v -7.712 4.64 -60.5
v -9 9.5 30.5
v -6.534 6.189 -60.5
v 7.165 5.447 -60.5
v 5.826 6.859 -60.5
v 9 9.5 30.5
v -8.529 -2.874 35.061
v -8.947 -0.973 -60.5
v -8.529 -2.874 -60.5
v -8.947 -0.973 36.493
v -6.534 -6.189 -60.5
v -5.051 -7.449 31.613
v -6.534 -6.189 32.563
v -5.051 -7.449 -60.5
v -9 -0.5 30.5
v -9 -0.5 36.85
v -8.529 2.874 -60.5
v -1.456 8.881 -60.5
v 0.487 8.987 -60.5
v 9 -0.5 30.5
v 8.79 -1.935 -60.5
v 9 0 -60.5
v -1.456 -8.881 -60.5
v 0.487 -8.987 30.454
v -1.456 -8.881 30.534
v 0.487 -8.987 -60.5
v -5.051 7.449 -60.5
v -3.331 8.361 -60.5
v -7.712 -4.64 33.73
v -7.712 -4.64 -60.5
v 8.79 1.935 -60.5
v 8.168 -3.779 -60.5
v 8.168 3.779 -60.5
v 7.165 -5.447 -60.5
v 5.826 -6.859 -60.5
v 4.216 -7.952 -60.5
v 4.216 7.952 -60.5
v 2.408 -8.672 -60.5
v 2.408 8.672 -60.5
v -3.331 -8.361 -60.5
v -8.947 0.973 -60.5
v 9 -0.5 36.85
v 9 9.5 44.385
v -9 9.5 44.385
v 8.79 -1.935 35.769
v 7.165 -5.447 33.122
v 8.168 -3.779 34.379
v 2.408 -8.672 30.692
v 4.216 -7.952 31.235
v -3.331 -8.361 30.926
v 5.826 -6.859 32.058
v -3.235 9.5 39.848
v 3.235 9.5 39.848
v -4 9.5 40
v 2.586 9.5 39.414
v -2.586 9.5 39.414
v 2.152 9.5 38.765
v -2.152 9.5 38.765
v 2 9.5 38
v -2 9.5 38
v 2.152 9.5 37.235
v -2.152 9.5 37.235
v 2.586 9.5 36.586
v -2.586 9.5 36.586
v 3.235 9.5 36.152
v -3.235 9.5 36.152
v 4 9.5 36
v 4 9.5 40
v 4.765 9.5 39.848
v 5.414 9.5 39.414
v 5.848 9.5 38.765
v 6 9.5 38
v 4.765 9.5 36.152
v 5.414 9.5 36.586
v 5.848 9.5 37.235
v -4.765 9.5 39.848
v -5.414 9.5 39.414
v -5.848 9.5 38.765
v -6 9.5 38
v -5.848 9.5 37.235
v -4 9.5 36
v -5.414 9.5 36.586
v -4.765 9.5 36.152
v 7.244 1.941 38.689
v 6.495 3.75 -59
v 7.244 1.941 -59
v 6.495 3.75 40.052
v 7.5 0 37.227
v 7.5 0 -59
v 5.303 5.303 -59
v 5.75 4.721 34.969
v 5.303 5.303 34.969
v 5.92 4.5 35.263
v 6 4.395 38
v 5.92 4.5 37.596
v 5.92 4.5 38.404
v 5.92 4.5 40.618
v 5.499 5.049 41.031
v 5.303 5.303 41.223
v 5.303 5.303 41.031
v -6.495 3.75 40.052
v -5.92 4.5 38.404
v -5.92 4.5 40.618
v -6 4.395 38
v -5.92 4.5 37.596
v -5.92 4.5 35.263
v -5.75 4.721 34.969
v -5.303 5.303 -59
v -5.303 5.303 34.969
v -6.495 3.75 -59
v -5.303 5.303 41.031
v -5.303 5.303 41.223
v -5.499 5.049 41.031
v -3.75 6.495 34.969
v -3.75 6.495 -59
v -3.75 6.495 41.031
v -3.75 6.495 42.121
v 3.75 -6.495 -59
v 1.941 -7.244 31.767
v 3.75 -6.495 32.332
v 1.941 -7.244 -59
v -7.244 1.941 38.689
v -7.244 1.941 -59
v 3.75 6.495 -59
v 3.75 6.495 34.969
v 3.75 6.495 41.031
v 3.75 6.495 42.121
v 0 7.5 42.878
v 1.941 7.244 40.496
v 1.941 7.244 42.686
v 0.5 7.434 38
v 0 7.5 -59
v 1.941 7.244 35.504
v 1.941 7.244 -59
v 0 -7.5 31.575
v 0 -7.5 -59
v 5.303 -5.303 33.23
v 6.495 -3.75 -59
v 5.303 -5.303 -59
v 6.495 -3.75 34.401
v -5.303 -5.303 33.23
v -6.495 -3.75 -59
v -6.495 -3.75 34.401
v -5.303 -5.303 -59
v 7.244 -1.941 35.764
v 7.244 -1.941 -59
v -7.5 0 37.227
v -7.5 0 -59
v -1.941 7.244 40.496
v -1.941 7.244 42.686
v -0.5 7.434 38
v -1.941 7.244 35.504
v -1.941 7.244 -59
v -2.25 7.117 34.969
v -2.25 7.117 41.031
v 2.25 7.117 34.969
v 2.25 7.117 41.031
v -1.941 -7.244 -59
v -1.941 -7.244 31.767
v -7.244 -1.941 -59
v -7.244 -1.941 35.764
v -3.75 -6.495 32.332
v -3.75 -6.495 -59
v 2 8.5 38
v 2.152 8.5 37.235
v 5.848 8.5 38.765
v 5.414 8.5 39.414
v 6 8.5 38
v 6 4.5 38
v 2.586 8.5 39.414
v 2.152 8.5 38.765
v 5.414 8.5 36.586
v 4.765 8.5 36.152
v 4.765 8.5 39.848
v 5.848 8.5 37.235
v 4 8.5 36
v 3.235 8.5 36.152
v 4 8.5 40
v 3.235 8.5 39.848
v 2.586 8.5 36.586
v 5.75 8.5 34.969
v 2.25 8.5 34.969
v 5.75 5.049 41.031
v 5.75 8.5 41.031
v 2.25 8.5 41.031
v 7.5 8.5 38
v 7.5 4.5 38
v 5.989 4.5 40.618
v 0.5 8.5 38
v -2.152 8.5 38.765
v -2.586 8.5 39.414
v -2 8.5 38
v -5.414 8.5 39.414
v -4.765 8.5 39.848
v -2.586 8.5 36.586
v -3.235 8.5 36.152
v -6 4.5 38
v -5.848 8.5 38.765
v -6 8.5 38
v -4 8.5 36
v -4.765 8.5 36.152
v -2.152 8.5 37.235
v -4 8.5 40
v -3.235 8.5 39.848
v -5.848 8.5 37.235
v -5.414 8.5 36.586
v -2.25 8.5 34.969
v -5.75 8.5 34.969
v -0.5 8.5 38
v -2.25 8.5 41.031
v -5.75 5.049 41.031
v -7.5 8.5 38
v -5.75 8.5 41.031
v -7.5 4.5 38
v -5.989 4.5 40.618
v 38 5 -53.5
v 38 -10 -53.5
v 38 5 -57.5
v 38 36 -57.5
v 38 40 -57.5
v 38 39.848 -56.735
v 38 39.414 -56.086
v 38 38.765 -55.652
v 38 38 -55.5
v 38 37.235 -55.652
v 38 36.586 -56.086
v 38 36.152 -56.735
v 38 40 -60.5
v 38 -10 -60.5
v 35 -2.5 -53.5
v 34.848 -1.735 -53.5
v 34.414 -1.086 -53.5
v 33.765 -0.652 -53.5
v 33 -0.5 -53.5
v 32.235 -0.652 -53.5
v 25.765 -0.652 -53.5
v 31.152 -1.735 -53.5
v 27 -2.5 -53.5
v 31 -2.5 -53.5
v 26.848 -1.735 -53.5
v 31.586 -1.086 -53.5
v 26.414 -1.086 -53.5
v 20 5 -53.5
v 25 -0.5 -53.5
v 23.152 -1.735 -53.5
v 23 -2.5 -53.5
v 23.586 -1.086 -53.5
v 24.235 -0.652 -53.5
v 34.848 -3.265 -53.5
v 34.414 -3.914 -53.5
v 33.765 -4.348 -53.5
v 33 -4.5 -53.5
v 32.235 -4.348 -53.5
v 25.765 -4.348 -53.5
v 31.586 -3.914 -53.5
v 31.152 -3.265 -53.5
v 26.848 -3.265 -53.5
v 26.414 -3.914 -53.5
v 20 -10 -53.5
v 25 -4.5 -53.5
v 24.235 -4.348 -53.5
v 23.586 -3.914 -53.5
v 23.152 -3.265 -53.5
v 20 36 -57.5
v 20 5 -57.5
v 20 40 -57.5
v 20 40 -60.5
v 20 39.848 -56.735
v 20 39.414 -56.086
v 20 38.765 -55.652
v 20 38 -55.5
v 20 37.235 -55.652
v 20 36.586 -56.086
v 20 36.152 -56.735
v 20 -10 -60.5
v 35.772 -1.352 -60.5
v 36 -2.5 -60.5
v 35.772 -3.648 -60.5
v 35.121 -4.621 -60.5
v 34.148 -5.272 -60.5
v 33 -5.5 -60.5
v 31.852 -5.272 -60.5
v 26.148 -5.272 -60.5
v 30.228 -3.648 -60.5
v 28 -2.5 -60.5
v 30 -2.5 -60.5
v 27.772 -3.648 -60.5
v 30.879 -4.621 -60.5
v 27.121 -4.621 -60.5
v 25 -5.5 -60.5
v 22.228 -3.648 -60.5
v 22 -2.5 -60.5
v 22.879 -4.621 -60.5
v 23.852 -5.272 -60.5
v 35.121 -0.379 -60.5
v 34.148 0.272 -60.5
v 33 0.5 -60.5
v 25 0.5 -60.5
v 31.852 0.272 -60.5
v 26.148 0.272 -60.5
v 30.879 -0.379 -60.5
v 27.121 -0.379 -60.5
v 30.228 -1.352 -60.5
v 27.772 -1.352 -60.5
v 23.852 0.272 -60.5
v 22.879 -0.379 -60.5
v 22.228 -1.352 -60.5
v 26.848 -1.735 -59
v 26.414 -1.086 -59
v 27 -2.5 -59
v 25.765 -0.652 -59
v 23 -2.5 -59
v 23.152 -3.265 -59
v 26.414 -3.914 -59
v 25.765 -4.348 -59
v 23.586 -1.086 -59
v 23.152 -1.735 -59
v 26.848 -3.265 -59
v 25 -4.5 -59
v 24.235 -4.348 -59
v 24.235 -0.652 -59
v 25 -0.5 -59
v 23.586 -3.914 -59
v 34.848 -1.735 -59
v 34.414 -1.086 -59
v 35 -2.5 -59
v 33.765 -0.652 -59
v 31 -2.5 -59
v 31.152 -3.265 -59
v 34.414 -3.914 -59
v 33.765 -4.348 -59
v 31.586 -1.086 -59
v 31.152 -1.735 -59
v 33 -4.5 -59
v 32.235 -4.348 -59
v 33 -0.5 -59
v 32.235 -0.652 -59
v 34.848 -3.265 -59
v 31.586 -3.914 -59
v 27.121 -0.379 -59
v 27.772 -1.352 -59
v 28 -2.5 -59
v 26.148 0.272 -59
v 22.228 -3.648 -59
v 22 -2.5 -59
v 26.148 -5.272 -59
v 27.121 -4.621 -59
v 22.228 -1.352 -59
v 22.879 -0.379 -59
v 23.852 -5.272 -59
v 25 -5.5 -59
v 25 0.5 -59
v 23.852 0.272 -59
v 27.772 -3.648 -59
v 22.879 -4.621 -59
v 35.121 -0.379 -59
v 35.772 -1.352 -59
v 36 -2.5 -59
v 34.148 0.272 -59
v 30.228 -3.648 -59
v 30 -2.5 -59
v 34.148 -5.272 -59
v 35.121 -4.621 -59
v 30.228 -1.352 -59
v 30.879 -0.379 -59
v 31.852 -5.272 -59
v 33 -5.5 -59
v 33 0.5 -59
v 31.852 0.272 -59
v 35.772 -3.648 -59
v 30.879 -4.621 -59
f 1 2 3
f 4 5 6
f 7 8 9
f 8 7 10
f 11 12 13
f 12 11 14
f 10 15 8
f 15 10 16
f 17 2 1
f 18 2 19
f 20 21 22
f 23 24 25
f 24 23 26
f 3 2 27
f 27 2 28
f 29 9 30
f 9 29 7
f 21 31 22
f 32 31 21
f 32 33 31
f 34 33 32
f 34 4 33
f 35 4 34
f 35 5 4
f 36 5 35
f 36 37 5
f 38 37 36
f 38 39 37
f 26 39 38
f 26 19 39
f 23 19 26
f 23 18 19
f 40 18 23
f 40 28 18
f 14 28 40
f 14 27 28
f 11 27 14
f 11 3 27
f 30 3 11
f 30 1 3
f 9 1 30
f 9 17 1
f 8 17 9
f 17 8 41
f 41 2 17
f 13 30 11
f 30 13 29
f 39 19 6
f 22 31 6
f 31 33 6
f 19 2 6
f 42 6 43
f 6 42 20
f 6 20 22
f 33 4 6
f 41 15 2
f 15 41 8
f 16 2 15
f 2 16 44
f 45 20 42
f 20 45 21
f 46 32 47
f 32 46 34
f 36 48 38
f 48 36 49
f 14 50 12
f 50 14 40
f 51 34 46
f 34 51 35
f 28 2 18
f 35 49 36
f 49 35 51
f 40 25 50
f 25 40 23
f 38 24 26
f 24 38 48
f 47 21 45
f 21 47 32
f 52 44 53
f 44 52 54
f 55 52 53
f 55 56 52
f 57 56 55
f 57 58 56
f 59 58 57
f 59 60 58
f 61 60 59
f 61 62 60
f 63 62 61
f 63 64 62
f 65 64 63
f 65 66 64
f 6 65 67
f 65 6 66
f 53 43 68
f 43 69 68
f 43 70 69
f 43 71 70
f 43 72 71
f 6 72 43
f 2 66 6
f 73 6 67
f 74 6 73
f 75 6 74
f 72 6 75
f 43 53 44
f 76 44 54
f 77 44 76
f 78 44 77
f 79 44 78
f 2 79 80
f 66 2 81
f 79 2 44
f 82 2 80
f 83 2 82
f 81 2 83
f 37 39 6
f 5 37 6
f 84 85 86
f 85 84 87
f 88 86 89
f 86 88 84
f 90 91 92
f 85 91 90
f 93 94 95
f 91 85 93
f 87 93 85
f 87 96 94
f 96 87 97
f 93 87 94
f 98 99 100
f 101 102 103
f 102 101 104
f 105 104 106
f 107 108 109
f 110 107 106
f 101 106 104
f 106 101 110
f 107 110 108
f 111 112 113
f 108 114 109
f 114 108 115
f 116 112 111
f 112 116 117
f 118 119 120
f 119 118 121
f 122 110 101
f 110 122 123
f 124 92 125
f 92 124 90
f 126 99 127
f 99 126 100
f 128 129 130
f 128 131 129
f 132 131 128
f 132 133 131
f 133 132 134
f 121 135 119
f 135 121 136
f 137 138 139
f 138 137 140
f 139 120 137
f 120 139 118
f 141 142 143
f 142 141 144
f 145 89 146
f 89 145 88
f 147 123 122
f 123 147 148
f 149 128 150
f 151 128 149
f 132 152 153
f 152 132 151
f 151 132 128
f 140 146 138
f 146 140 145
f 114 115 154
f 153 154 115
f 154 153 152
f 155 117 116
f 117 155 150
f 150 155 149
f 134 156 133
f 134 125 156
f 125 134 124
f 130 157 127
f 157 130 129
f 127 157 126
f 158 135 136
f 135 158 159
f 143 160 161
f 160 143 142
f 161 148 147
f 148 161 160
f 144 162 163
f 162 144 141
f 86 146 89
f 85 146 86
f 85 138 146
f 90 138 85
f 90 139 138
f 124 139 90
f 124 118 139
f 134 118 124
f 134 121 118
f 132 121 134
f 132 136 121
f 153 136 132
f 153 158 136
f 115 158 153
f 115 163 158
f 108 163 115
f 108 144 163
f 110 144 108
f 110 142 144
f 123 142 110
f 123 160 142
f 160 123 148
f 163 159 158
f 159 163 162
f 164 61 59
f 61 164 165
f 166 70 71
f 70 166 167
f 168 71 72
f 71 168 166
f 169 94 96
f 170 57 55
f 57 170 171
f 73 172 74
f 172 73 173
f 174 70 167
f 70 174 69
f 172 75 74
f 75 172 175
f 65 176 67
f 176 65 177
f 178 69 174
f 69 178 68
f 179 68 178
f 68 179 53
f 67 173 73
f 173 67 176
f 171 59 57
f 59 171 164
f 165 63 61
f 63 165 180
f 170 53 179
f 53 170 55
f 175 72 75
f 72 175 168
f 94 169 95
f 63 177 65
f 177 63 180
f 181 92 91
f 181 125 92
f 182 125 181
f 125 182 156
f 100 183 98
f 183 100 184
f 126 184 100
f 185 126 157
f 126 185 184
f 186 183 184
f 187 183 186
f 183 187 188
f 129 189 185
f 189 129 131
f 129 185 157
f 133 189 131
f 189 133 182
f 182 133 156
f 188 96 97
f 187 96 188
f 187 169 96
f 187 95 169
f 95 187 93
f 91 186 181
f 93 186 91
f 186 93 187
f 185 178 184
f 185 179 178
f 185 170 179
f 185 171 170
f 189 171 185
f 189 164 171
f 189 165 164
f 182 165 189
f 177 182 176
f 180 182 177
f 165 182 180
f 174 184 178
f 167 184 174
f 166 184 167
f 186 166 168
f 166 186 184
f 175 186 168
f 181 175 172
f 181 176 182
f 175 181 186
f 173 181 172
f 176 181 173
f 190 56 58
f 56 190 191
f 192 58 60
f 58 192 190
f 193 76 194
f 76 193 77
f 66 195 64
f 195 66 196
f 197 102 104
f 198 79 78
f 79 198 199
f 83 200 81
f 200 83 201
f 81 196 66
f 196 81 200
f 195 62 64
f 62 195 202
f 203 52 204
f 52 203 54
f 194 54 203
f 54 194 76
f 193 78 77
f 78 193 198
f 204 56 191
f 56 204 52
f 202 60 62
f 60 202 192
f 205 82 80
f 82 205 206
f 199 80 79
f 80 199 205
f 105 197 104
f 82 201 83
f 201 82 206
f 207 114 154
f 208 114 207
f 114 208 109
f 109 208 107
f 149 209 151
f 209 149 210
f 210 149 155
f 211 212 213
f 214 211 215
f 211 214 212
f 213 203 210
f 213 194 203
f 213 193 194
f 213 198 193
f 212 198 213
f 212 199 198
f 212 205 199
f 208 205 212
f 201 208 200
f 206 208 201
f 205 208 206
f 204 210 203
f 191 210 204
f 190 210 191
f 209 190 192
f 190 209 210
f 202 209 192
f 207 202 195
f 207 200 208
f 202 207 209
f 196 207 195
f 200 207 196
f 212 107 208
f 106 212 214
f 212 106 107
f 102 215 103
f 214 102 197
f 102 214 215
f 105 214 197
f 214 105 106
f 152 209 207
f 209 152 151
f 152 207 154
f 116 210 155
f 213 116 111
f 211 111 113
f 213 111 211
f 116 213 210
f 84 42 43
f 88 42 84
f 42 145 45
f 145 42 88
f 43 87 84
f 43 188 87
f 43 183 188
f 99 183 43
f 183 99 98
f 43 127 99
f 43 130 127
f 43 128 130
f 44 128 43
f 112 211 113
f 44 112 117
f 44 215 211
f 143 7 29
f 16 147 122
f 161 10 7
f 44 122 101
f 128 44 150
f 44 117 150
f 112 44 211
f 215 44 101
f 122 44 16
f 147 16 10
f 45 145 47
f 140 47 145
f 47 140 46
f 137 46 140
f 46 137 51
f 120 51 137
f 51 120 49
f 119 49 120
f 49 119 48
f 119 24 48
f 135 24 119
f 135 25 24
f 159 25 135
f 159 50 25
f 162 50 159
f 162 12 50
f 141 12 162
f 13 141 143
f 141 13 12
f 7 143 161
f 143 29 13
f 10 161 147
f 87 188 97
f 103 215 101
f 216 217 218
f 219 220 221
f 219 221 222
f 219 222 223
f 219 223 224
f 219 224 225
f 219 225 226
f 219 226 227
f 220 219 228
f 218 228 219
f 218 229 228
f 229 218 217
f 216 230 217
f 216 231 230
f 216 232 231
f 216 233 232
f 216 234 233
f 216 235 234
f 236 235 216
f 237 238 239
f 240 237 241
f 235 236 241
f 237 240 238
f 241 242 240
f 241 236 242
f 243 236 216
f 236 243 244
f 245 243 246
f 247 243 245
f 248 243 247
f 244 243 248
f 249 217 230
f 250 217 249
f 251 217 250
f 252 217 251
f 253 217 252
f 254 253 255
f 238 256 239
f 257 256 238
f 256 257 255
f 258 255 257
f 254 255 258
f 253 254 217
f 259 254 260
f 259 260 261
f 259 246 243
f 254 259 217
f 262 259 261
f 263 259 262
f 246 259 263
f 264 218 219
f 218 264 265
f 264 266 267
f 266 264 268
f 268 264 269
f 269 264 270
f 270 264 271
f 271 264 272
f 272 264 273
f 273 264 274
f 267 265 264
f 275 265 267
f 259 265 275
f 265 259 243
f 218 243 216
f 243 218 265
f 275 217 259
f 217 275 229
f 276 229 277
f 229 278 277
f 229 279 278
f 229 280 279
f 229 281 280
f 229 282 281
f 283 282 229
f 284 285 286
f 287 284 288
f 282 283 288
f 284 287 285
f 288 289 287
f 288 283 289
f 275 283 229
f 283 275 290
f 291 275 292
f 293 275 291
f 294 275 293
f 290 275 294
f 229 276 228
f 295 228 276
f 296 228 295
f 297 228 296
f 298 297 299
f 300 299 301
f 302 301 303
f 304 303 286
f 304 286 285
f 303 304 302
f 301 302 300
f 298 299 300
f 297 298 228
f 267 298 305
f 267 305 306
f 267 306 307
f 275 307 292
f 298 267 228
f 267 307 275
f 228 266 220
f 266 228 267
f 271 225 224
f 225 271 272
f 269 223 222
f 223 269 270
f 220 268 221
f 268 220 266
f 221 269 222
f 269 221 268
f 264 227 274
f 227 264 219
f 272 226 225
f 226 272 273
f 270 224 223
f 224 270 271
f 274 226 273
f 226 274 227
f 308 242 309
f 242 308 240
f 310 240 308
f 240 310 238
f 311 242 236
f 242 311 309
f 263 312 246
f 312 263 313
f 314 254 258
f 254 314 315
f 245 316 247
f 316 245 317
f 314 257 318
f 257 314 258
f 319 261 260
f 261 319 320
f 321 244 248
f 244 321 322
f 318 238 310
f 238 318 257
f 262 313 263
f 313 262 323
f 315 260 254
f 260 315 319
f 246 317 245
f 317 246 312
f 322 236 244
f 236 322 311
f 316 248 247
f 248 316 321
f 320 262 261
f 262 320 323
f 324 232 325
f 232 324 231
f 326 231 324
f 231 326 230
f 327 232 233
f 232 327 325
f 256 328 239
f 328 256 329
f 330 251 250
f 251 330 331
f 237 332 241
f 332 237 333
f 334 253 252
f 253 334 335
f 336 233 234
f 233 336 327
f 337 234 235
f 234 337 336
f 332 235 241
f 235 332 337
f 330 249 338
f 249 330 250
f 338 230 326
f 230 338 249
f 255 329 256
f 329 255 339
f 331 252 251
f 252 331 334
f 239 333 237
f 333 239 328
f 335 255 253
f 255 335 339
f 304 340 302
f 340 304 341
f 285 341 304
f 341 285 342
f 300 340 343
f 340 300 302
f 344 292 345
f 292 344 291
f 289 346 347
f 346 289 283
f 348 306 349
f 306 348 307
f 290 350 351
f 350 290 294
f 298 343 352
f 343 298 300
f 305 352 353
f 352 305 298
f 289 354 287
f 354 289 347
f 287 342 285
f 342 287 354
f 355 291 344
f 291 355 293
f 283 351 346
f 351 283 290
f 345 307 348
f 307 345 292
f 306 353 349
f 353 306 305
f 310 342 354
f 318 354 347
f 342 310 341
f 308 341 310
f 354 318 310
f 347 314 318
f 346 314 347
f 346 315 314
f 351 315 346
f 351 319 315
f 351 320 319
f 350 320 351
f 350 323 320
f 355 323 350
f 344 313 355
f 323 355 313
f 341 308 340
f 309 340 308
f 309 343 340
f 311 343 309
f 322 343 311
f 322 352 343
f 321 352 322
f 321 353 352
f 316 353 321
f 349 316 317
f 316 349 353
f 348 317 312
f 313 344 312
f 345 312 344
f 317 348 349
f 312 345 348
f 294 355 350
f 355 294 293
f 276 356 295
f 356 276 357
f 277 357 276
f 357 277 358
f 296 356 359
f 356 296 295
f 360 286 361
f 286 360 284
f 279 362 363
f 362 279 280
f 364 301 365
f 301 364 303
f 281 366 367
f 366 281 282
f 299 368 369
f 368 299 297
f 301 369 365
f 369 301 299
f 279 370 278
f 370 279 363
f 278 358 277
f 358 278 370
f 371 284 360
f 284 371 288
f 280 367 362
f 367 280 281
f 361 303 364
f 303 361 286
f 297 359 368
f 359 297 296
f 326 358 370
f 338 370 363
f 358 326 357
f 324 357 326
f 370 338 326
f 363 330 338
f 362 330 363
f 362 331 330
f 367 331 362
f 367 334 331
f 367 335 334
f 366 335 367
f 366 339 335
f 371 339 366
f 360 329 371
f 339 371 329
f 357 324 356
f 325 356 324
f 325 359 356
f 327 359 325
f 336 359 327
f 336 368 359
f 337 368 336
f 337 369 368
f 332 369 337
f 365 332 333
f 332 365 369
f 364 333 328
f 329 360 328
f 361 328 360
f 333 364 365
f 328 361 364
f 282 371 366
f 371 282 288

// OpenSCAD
// [FL_INDEX: keywords="openscad, 3d_parametric, customizable_e-cigarette_holster, csg_solid" | COT="Parametric OpenSCAD design from 3DCodeverse"]
// Title: customizable e-cigarette holster

//Length of the clip
clip_length = 50;
//inner length of sheath, length of accu from knob downwards
inner_length = 90;
//inner Diameter, Diameter of accu + some tolerance
inner_dia = 15;
// which part should be rendered?
part = "plate"; //[assy:Assembly,sheath:Sheath only,clip:Clip only,plate:Both parts for printing]

module print_part()
{
if(part=="assy"){
assembly();
}else if(part=="sheath"){
sheath();
}else if(part=="clip"){
clip();
}else if(part=="plate"){
plate();
}
}
module sheath()
{
difference()
{
hull()
{
translate([0,0,-inner_length/2+37.5])
cylinder(r=inner_dia/2+1.5,h=inner_length+16,center=true);
translate([0,inner_dia/2-3,38])
cube([inner_dia+3,10,15],center=true);
}
translate([0,0,-inner_length/2+46.5])
cylinder(r=inner_dia/2,h=inner_length+31,center=true);

translate([4,inner_dia/2,38])
rotate([90,0,0])
cylinder(r=2,h=7,center=true,$fn=16);

translate([4,inner_dia/2-1,38])
rotate([90,0,0])
cylinder(r=3.5,h=4,center=true,$fn=6);

translate([-4,inner_dia/2,38])
rotate([90,0,0])
cylinder(r=2,h=7,center=true,$fn=16);

translate([-4,inner_dia/2-1,38])
rotate([90,0,0])
cylinder(r=3.5,h=4,center=true,$fn=6);

translate([0,0,51])
rotate([37,0,0])
cube([inner_dia*2,inner_dia*3,22],center=true);
}
}

module clip()
{
difference()
{
union()
{
cube([18,15,4],center=false);
translate([0,0,-3])
cube([18,clip_length,3],center=false);
translate([0,clip_length-2,0])
rotate([0,90,0])
cylinder(r=2,h=18,$fn=16);
}
translate([5,7.5,0])
cylinder(r=2,h=15,center=true,$fn=16);
translate([13,7.5,0])
cylinder(r=2,h=15,center=true,$fn=16);

translate([5,7.5,-2.5])
cylinder(r=3,h=2,center=true,$fn=16);
translate([13,7.5,-2.5])
cylinder(r=3,h=2,center=true,$fn=16);
}
}
module plate()
{
sheath();
translate([20,-10,-inner_length+32.5])
clip();
}
module assembly()
{
sheath();
translate([9,17,45.5])
rotate([90,180,0])
clip();
}

print_part();
